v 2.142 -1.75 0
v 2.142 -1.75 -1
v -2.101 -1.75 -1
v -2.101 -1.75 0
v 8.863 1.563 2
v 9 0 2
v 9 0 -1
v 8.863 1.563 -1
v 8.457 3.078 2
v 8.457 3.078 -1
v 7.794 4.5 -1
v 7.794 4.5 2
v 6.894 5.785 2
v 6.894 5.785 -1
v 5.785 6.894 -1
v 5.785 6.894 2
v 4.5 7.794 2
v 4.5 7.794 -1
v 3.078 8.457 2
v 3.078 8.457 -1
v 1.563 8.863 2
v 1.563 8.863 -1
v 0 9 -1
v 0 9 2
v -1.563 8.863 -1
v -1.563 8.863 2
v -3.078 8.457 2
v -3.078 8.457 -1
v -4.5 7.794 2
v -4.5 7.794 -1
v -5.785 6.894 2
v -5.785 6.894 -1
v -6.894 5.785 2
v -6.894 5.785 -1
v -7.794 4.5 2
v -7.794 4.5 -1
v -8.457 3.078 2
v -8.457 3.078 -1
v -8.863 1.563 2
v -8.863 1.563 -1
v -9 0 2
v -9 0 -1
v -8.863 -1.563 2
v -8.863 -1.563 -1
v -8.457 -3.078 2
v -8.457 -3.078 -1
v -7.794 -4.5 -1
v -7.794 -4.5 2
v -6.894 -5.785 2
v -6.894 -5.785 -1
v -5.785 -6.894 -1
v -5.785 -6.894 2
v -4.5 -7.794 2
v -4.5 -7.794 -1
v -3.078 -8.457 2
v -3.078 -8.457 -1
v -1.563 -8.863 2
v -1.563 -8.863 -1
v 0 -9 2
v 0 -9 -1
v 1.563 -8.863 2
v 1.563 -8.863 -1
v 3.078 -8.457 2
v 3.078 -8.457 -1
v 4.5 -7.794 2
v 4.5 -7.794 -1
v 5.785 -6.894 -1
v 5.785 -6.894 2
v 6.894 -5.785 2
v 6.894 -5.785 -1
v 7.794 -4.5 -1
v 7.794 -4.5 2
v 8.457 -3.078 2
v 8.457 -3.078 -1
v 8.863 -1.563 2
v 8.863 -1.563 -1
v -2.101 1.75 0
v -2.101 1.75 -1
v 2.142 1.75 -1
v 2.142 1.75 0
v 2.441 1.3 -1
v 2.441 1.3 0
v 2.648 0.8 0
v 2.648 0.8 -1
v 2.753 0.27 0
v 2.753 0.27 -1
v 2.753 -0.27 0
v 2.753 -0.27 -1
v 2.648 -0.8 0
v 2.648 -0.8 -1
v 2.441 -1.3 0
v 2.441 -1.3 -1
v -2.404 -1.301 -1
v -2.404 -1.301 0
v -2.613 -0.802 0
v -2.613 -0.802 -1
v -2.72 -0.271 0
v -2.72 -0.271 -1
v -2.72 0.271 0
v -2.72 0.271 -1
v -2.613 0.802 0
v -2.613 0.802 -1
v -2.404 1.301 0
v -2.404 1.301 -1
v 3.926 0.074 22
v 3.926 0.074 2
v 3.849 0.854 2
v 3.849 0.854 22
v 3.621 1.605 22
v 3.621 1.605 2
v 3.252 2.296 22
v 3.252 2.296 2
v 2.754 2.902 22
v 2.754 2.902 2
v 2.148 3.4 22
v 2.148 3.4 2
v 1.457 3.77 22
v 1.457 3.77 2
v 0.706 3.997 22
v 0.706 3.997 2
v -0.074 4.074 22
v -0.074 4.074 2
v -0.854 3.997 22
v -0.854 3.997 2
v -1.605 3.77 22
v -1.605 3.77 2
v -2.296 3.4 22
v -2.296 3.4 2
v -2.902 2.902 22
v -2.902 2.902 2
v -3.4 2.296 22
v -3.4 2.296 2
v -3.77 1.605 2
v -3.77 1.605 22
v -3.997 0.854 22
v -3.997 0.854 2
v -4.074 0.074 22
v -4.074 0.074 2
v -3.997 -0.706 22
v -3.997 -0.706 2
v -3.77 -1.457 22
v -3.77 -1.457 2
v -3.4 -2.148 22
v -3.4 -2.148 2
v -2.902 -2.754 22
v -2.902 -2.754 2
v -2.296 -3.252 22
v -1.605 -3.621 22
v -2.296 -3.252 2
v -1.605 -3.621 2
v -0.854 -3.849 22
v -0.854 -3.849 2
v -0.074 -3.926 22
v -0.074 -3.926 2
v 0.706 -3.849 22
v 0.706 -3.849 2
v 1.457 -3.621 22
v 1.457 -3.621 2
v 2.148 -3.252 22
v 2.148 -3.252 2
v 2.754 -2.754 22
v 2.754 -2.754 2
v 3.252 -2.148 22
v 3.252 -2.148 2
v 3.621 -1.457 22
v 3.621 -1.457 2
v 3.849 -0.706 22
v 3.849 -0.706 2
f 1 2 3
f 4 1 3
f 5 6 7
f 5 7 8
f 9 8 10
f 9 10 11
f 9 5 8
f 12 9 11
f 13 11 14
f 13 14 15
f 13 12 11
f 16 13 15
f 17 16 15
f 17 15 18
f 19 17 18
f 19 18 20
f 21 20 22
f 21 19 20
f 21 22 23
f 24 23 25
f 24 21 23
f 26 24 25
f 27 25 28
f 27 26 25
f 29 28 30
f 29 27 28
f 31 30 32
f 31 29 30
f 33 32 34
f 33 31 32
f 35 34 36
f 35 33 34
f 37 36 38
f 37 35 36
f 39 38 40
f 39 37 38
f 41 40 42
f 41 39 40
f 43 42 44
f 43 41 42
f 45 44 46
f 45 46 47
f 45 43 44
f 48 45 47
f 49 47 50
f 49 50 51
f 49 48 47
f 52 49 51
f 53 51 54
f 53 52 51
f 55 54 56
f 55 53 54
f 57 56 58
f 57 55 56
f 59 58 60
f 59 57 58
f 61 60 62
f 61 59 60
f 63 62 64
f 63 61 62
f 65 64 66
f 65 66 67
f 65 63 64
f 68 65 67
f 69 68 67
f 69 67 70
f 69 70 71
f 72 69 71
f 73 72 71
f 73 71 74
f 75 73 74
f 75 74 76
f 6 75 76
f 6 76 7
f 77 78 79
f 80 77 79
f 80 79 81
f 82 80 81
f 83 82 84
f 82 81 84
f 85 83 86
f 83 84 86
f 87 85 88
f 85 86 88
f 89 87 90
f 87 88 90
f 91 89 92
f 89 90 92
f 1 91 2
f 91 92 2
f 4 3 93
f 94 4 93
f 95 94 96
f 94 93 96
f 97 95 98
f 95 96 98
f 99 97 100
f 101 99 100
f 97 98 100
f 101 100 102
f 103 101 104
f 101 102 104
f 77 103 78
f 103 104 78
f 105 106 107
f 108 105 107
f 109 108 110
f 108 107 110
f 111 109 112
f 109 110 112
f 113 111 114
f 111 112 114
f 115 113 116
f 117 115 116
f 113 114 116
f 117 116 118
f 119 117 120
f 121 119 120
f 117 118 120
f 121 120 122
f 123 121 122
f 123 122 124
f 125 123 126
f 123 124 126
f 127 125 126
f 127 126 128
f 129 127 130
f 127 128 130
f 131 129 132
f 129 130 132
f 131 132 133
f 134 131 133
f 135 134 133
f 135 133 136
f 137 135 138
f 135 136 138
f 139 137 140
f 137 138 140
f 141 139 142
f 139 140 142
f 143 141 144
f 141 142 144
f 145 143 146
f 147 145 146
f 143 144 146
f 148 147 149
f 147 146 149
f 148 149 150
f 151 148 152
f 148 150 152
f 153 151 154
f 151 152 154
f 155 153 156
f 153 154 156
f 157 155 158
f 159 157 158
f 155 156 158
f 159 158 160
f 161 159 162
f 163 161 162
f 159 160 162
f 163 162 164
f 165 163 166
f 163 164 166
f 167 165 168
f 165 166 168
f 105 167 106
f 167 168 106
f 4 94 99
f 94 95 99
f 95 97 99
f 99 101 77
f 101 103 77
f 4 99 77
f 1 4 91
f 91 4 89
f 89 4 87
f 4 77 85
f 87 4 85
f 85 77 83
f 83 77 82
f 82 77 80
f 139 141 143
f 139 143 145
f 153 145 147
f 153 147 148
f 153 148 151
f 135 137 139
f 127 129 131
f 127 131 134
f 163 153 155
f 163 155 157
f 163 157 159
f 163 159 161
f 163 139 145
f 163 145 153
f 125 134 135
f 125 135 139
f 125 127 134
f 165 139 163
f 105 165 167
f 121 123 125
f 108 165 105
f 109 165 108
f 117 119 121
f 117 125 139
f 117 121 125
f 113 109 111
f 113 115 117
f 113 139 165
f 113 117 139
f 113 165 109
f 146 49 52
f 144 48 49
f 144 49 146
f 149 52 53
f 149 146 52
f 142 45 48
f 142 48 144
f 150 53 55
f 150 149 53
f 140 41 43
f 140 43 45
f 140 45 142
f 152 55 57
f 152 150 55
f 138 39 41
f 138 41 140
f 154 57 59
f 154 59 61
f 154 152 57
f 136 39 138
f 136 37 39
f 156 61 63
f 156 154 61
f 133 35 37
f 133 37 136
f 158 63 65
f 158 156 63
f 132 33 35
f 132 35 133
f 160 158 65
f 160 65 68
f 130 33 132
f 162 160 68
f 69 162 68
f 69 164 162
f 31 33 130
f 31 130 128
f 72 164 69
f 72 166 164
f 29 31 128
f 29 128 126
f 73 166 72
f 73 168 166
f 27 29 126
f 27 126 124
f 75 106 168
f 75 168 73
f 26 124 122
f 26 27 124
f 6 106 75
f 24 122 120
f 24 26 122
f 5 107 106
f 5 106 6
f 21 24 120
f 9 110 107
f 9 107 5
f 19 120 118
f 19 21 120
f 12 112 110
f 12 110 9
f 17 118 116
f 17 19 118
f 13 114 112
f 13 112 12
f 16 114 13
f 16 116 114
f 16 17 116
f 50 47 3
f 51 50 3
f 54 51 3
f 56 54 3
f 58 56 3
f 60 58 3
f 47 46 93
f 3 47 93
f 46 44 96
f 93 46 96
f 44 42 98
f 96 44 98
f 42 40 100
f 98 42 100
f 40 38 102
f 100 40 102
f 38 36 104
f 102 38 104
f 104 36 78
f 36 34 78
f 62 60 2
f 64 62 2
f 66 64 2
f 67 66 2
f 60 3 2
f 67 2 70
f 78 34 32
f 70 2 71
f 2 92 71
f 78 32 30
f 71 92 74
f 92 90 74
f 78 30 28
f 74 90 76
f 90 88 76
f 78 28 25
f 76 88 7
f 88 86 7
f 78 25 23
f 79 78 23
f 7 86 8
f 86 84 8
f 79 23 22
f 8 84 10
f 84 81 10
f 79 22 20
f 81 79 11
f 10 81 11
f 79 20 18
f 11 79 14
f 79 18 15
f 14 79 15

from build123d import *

# Parameters (mm, degrees)
SKETCH1_R                = 8
BOSS_EXTRUDE1_DEPTH      = 2
SKETCH2_R                = 9
BOSS_EXTRUDE2_DEPTH      = 3
CUT_EXTRUDE1_DEPTH       = 10.0001
CUT_EXTRUDE1_DEPTH_BACK  = 10
BOSS_EXTRUDE3_DEPTH      = 2
BOSS_EXTRUDE3_DEPTH_BACK = 0.0001
SKETCH1_3_R              = 8
SKETCH3_R                = 4
BOSS_EXTRUDE4_DEPTH      = 20


with BuildPart() as part:
    # Sketch1 → Boss-Extrude1 (new body)
    with BuildSketch(Plane.XY):
        Circle(SKETCH1_R)
        with BuildLine():
            Line((-2.100590034, 1.75), (2.142050653, 1.75))
            ThreePointArc((2.142050653, 1.75), (2.766022596, 0), (2.142050653, -1.75))
            Line((2.142050653, -1.75), (-2.100590034, -1.75))
            ThreePointArc((-2.100590034, -1.75), (-2.733195007, 0), (-2.100590034, 1.75))
        make_face(mode=Mode.SUBTRACT)
    extrude(amount=BOSS_EXTRUDE1_DEPTH)

    # Sketch2 → Boss-Extrude2 (add)
    with BuildSketch(Plane.XY.offset(2)):
        Circle(SKETCH2_R)
    extrude(amount=-BOSS_EXTRUDE2_DEPTH)

    # Sketch1<2> → Cut-Extrude1 (cut, two sides: drawn at the far end of the back side and taken through both)
    with BuildSketch(Plane.XY.offset(-CUT_EXTRUDE1_DEPTH_BACK)):
        with BuildLine():
            Line((2.142050653, 1.75), (-2.100590034, 1.75))
            ThreePointArc((-2.100590034, 1.75), (-2.733195007, 0), (-2.100590034, -1.75))
            Line((-2.100590034, -1.75), (2.142050653, -1.75))
            ThreePointArc((2.142050653, -1.75), (2.766022596, 0), (2.142050653, 1.75))
        make_face()
    extrude(amount=CUT_EXTRUDE1_DEPTH + CUT_EXTRUDE1_DEPTH_BACK, mode=Mode.SUBTRACT)

    # Sketch1<3> → Boss-Extrude3 (add, two sides: drawn at the far end of the back side and taken through both)
    with BuildSketch(Plane.XY.offset(-BOSS_EXTRUDE3_DEPTH_BACK)):
        Circle(SKETCH1_3_R)
    extrude(amount=BOSS_EXTRUDE3_DEPTH + BOSS_EXTRUDE3_DEPTH_BACK)

    # Sketch3 → Boss-Extrude4 (add)
    with BuildSketch(Plane.XY.offset(2)):
        with Locations((-0.074058603, 0.074058603)):
            Circle(SKETCH3_R)
    extrude(amount=BOSS_EXTRUDE4_DEPTH)


solid = part.part
